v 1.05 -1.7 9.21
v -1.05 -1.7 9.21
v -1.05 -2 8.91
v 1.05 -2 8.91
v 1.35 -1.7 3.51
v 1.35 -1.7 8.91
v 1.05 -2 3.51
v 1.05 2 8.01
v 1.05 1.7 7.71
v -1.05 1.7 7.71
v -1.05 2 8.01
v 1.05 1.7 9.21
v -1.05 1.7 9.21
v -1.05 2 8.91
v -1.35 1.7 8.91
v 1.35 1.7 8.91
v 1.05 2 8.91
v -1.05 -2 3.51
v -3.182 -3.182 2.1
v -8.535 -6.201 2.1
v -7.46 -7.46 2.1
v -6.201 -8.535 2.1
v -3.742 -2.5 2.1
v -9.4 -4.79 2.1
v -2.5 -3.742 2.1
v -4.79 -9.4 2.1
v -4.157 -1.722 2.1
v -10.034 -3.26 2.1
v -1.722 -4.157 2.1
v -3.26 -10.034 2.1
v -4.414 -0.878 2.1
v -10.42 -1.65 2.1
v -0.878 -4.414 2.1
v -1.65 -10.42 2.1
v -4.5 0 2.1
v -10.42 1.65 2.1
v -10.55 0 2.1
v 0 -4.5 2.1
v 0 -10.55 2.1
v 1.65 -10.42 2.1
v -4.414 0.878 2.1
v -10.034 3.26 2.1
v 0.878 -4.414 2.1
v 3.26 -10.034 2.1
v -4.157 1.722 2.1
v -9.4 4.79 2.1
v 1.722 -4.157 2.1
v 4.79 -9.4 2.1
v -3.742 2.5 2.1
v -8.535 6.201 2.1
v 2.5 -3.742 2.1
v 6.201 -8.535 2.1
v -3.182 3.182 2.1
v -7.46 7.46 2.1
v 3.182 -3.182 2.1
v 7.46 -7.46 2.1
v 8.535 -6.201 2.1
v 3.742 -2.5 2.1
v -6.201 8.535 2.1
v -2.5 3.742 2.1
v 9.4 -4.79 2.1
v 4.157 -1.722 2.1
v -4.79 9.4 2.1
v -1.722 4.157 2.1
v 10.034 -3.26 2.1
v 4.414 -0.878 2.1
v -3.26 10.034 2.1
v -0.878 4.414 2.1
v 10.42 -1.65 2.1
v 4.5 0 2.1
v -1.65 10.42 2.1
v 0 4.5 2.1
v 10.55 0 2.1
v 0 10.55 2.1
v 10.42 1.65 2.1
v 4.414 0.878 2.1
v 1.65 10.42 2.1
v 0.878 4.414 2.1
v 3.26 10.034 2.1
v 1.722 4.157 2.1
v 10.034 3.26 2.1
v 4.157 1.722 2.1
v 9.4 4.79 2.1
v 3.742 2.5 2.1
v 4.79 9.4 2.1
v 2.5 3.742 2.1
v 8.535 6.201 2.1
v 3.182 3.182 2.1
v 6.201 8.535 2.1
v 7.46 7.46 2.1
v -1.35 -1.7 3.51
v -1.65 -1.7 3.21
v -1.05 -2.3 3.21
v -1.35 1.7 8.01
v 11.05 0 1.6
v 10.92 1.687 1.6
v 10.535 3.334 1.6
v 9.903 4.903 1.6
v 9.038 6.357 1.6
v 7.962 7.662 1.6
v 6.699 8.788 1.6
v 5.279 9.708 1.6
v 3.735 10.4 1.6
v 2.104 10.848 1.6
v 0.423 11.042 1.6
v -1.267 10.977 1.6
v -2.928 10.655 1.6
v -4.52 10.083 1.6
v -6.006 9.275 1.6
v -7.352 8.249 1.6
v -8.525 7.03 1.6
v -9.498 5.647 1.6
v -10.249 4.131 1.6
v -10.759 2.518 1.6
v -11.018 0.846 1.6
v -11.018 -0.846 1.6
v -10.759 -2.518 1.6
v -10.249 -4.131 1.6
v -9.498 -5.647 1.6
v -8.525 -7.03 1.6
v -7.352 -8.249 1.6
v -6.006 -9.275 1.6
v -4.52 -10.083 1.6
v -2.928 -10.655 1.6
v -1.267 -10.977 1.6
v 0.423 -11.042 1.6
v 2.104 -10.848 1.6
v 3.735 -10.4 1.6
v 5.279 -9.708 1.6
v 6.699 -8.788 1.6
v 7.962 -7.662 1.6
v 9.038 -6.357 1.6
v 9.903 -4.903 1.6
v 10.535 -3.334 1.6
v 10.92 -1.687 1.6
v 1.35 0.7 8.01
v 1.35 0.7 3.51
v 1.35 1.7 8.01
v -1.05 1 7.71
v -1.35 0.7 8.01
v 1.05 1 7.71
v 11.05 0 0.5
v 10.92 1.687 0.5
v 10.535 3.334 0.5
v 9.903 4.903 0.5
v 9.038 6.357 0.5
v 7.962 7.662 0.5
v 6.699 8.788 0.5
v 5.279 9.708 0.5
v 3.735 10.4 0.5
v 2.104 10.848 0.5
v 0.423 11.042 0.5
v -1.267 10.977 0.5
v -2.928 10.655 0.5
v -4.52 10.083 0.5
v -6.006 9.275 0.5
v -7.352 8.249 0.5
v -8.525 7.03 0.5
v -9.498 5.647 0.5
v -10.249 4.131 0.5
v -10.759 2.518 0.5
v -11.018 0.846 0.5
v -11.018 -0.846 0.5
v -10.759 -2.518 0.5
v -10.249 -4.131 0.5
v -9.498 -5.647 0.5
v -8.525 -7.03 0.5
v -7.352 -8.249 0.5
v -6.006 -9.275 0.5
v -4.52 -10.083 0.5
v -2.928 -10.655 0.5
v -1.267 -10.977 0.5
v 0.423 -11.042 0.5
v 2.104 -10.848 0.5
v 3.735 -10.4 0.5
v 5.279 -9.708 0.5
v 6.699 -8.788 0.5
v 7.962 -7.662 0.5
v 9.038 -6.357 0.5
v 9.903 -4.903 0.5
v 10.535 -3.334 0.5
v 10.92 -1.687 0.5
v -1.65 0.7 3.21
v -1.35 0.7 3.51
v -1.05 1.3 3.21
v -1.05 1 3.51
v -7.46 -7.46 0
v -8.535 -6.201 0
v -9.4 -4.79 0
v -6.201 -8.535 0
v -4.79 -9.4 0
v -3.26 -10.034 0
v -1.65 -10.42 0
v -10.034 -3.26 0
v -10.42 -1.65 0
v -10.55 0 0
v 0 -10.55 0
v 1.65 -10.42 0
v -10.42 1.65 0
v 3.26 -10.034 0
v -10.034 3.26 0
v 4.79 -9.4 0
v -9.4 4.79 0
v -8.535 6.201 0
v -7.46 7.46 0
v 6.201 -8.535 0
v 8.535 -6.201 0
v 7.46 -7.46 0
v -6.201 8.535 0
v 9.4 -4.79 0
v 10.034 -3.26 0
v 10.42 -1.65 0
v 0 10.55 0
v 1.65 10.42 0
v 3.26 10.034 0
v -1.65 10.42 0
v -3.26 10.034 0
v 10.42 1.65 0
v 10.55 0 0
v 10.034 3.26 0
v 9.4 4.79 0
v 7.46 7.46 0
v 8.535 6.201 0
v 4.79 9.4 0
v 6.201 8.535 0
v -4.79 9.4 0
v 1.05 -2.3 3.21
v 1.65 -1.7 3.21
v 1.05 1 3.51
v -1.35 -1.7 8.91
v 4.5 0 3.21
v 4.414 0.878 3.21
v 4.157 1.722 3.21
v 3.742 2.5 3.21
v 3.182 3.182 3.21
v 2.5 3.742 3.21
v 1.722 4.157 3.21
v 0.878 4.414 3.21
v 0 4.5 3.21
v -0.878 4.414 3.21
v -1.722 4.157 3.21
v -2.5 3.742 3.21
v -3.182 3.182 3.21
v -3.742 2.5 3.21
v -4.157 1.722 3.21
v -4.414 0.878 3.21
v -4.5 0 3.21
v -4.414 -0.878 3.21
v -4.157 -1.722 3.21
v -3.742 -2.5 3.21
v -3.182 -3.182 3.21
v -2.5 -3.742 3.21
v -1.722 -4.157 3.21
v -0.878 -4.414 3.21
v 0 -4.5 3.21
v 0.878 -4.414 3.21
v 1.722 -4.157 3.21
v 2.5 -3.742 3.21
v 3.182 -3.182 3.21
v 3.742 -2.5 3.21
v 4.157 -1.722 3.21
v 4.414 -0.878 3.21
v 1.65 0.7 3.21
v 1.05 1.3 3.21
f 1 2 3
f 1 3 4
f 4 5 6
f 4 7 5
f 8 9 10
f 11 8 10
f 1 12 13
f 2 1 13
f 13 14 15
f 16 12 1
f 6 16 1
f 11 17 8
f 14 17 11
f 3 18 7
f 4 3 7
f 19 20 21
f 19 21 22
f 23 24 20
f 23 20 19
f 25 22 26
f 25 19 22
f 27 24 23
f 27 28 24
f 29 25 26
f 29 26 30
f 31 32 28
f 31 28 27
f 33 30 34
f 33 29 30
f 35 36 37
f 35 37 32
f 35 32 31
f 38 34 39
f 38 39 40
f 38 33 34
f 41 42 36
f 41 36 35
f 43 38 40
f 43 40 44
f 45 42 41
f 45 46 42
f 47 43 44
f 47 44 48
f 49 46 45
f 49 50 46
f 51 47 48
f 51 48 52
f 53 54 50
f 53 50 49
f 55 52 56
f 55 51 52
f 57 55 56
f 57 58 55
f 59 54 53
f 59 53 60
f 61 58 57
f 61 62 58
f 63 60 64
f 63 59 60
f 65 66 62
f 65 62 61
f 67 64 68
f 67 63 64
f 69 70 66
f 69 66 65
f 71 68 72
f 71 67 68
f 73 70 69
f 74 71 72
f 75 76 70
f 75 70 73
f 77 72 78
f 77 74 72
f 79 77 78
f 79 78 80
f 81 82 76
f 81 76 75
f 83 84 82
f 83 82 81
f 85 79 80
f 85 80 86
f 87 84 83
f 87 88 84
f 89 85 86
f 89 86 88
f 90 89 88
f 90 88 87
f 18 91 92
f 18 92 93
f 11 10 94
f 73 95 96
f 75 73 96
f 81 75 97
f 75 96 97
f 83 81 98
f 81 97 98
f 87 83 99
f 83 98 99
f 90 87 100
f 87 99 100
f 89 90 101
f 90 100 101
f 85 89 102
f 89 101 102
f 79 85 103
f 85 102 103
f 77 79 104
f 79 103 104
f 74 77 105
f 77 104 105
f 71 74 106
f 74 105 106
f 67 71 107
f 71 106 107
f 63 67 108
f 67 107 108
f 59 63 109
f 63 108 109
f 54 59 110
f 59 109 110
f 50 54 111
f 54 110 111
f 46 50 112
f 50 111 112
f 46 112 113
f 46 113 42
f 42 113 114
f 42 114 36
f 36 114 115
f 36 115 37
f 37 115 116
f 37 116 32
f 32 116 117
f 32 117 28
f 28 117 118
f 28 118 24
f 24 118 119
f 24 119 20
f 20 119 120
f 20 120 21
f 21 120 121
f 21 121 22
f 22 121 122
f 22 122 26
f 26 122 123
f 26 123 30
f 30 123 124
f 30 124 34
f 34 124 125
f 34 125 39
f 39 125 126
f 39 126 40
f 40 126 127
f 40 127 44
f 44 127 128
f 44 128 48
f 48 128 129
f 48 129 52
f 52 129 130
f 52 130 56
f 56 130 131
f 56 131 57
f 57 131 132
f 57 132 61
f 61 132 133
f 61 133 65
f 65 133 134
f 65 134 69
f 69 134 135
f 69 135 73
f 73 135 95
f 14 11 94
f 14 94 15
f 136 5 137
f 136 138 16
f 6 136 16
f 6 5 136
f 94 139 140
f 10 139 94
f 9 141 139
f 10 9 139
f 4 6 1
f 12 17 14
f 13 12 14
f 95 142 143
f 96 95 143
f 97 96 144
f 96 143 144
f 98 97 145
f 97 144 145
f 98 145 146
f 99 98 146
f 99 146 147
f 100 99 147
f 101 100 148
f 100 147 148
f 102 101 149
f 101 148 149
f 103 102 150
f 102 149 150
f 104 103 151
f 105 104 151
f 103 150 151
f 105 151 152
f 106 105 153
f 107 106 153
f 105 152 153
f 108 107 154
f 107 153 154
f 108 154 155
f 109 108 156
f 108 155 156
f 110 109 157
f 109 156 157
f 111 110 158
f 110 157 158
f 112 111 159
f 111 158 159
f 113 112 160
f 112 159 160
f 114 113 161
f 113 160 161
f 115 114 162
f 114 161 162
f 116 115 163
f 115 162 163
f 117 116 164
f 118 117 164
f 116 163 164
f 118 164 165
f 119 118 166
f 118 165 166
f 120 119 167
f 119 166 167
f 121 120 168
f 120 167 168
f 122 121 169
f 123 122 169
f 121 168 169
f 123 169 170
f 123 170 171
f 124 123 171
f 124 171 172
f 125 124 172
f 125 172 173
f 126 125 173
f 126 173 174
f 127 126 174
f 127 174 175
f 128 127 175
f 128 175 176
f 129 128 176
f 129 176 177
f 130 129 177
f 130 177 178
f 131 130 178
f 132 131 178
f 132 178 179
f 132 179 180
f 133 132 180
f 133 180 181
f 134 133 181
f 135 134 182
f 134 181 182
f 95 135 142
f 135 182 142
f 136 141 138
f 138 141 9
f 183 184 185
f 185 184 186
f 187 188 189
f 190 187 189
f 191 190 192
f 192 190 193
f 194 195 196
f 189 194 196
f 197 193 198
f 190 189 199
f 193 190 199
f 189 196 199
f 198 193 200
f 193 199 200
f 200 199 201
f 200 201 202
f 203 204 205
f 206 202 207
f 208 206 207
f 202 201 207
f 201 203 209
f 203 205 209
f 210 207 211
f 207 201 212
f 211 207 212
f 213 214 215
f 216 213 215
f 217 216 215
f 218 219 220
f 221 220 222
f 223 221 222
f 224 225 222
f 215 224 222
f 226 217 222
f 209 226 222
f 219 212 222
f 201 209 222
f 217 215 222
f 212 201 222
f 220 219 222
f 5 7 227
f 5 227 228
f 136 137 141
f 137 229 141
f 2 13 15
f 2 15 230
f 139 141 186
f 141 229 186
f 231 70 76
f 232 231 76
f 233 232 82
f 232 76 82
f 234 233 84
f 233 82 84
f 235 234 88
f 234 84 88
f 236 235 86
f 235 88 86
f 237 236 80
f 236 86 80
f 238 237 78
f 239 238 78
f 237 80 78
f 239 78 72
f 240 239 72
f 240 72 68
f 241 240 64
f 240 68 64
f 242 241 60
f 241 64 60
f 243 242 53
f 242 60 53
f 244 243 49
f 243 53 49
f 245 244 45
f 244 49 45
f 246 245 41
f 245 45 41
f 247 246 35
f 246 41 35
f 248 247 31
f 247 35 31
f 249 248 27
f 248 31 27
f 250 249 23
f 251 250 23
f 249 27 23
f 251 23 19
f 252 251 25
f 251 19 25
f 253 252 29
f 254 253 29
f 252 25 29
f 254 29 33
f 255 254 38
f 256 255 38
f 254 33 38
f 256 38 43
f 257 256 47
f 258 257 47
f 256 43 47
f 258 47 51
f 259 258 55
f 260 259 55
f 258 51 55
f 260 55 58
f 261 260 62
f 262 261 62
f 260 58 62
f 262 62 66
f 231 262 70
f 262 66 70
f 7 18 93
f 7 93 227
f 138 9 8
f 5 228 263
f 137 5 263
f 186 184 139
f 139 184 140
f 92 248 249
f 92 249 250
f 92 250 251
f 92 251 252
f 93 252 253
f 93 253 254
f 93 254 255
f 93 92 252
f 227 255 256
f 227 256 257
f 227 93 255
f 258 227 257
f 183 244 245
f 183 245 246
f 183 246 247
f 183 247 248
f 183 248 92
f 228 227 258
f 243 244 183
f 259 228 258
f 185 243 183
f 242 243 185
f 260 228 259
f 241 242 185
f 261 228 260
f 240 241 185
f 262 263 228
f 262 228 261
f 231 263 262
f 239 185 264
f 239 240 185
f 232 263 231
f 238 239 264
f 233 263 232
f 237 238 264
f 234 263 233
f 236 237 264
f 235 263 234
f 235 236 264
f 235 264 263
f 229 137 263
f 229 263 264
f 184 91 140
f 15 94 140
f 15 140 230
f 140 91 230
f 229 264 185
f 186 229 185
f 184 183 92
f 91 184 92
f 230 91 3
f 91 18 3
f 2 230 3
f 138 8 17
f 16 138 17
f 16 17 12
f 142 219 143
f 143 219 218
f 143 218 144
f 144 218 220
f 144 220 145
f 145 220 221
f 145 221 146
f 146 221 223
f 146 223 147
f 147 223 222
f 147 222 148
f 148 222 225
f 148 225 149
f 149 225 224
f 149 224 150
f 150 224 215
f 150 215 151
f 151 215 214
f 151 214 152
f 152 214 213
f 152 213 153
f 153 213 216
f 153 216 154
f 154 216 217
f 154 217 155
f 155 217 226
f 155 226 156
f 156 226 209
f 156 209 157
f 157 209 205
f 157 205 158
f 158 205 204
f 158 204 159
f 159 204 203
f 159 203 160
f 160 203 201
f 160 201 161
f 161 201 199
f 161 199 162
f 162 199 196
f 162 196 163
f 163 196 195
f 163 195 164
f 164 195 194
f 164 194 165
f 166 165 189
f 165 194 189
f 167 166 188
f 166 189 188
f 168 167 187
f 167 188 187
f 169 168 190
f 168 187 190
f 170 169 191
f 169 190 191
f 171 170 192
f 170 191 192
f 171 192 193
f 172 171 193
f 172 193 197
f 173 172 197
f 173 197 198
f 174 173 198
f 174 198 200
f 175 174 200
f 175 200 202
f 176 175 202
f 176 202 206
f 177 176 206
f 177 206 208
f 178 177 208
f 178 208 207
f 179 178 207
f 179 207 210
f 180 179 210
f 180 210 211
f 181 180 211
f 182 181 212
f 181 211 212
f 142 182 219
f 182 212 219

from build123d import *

# Parameters (mm, degrees)
F0_R     = 11.05
F1_DEPTH = 2.1
F2_R     = 4.5
F3_DEPTH = 1.11
F6_DEPTH = 6
F7_W     = 2.7
F7_H     = 1.5
F8_DEPTH = 1
F9_SIZE  = 0.3
F10_SIZE = 0.5


# Not quite as in the source:
# - two fillets or chamfers of one size are made in one step


with BuildPart() as f1:
    # F0 (on Top) → F1 (new body)
    with BuildSketch(Plane.XY):
        Circle(F0_R)
    extrude(amount=F1_DEPTH)

    # F2 (on face) → F3 (join)
    with BuildSketch(Plane.XY.offset(2.1)):
        Circle(F2_R)
    extrude(amount=F3_DEPTH)

    # F5 (on face) → F6 (join)
    with BuildSketch(Plane.XY.offset(3.21)):
        Polygon((-1.35, -2), (1.35, -2), (1.35, 0), (1.35, 1), (-1.35, 1), (-1.35, 0), align=None)
    extrude(amount=F6_DEPTH)

    # F7 (on face) → F8 (join)
    with BuildSketch(Plane(origin=(0, 1, 0), x_dir=(-1, 0, 0), z_dir=(0, 1, 0))):
        with Locations((0, 8.46)):
            Rectangle(F7_W, F7_H)
    extrude(amount=F8_DEPTH)

    # F9
    f9_edges = [f1.edges().sort_by_distance(p)[0] for p in [
        (-1.35, -2, 6.21),
        (1.35, -2, 6.21),
        (1.35, 1, 5.46),
        (-1.35, 1, 5.46),
        (1.35, 1.5, 7.71),
        (-1.35, 1.5, 7.71),
        (0, 2, 7.71),
        (1.35, 2, 8.46),
        (-1.35, 2, 8.46),
        (0, 2, 9.21),
        (1.35, 0, 9.21),
        (-1.35, 0, 9.21),
        (0, -2, 9.21),
        (-1.35, -0.5, 3.21),
        (0, -2, 3.21),
        (1.35, -0.5, 3.21),
        (0, 1, 3.21),
    ]]
    chamfer(f9_edges, length=F9_SIZE)

    # F10
    f10_edges = [f1.edges().sort_by_distance(p)[0] for p in [
        (-11.05, 0, 0),
        (-11.05, 0, 2.1),
    ]]
    chamfer(f10_edges, length=F10_SIZE)


solid = f1.part
